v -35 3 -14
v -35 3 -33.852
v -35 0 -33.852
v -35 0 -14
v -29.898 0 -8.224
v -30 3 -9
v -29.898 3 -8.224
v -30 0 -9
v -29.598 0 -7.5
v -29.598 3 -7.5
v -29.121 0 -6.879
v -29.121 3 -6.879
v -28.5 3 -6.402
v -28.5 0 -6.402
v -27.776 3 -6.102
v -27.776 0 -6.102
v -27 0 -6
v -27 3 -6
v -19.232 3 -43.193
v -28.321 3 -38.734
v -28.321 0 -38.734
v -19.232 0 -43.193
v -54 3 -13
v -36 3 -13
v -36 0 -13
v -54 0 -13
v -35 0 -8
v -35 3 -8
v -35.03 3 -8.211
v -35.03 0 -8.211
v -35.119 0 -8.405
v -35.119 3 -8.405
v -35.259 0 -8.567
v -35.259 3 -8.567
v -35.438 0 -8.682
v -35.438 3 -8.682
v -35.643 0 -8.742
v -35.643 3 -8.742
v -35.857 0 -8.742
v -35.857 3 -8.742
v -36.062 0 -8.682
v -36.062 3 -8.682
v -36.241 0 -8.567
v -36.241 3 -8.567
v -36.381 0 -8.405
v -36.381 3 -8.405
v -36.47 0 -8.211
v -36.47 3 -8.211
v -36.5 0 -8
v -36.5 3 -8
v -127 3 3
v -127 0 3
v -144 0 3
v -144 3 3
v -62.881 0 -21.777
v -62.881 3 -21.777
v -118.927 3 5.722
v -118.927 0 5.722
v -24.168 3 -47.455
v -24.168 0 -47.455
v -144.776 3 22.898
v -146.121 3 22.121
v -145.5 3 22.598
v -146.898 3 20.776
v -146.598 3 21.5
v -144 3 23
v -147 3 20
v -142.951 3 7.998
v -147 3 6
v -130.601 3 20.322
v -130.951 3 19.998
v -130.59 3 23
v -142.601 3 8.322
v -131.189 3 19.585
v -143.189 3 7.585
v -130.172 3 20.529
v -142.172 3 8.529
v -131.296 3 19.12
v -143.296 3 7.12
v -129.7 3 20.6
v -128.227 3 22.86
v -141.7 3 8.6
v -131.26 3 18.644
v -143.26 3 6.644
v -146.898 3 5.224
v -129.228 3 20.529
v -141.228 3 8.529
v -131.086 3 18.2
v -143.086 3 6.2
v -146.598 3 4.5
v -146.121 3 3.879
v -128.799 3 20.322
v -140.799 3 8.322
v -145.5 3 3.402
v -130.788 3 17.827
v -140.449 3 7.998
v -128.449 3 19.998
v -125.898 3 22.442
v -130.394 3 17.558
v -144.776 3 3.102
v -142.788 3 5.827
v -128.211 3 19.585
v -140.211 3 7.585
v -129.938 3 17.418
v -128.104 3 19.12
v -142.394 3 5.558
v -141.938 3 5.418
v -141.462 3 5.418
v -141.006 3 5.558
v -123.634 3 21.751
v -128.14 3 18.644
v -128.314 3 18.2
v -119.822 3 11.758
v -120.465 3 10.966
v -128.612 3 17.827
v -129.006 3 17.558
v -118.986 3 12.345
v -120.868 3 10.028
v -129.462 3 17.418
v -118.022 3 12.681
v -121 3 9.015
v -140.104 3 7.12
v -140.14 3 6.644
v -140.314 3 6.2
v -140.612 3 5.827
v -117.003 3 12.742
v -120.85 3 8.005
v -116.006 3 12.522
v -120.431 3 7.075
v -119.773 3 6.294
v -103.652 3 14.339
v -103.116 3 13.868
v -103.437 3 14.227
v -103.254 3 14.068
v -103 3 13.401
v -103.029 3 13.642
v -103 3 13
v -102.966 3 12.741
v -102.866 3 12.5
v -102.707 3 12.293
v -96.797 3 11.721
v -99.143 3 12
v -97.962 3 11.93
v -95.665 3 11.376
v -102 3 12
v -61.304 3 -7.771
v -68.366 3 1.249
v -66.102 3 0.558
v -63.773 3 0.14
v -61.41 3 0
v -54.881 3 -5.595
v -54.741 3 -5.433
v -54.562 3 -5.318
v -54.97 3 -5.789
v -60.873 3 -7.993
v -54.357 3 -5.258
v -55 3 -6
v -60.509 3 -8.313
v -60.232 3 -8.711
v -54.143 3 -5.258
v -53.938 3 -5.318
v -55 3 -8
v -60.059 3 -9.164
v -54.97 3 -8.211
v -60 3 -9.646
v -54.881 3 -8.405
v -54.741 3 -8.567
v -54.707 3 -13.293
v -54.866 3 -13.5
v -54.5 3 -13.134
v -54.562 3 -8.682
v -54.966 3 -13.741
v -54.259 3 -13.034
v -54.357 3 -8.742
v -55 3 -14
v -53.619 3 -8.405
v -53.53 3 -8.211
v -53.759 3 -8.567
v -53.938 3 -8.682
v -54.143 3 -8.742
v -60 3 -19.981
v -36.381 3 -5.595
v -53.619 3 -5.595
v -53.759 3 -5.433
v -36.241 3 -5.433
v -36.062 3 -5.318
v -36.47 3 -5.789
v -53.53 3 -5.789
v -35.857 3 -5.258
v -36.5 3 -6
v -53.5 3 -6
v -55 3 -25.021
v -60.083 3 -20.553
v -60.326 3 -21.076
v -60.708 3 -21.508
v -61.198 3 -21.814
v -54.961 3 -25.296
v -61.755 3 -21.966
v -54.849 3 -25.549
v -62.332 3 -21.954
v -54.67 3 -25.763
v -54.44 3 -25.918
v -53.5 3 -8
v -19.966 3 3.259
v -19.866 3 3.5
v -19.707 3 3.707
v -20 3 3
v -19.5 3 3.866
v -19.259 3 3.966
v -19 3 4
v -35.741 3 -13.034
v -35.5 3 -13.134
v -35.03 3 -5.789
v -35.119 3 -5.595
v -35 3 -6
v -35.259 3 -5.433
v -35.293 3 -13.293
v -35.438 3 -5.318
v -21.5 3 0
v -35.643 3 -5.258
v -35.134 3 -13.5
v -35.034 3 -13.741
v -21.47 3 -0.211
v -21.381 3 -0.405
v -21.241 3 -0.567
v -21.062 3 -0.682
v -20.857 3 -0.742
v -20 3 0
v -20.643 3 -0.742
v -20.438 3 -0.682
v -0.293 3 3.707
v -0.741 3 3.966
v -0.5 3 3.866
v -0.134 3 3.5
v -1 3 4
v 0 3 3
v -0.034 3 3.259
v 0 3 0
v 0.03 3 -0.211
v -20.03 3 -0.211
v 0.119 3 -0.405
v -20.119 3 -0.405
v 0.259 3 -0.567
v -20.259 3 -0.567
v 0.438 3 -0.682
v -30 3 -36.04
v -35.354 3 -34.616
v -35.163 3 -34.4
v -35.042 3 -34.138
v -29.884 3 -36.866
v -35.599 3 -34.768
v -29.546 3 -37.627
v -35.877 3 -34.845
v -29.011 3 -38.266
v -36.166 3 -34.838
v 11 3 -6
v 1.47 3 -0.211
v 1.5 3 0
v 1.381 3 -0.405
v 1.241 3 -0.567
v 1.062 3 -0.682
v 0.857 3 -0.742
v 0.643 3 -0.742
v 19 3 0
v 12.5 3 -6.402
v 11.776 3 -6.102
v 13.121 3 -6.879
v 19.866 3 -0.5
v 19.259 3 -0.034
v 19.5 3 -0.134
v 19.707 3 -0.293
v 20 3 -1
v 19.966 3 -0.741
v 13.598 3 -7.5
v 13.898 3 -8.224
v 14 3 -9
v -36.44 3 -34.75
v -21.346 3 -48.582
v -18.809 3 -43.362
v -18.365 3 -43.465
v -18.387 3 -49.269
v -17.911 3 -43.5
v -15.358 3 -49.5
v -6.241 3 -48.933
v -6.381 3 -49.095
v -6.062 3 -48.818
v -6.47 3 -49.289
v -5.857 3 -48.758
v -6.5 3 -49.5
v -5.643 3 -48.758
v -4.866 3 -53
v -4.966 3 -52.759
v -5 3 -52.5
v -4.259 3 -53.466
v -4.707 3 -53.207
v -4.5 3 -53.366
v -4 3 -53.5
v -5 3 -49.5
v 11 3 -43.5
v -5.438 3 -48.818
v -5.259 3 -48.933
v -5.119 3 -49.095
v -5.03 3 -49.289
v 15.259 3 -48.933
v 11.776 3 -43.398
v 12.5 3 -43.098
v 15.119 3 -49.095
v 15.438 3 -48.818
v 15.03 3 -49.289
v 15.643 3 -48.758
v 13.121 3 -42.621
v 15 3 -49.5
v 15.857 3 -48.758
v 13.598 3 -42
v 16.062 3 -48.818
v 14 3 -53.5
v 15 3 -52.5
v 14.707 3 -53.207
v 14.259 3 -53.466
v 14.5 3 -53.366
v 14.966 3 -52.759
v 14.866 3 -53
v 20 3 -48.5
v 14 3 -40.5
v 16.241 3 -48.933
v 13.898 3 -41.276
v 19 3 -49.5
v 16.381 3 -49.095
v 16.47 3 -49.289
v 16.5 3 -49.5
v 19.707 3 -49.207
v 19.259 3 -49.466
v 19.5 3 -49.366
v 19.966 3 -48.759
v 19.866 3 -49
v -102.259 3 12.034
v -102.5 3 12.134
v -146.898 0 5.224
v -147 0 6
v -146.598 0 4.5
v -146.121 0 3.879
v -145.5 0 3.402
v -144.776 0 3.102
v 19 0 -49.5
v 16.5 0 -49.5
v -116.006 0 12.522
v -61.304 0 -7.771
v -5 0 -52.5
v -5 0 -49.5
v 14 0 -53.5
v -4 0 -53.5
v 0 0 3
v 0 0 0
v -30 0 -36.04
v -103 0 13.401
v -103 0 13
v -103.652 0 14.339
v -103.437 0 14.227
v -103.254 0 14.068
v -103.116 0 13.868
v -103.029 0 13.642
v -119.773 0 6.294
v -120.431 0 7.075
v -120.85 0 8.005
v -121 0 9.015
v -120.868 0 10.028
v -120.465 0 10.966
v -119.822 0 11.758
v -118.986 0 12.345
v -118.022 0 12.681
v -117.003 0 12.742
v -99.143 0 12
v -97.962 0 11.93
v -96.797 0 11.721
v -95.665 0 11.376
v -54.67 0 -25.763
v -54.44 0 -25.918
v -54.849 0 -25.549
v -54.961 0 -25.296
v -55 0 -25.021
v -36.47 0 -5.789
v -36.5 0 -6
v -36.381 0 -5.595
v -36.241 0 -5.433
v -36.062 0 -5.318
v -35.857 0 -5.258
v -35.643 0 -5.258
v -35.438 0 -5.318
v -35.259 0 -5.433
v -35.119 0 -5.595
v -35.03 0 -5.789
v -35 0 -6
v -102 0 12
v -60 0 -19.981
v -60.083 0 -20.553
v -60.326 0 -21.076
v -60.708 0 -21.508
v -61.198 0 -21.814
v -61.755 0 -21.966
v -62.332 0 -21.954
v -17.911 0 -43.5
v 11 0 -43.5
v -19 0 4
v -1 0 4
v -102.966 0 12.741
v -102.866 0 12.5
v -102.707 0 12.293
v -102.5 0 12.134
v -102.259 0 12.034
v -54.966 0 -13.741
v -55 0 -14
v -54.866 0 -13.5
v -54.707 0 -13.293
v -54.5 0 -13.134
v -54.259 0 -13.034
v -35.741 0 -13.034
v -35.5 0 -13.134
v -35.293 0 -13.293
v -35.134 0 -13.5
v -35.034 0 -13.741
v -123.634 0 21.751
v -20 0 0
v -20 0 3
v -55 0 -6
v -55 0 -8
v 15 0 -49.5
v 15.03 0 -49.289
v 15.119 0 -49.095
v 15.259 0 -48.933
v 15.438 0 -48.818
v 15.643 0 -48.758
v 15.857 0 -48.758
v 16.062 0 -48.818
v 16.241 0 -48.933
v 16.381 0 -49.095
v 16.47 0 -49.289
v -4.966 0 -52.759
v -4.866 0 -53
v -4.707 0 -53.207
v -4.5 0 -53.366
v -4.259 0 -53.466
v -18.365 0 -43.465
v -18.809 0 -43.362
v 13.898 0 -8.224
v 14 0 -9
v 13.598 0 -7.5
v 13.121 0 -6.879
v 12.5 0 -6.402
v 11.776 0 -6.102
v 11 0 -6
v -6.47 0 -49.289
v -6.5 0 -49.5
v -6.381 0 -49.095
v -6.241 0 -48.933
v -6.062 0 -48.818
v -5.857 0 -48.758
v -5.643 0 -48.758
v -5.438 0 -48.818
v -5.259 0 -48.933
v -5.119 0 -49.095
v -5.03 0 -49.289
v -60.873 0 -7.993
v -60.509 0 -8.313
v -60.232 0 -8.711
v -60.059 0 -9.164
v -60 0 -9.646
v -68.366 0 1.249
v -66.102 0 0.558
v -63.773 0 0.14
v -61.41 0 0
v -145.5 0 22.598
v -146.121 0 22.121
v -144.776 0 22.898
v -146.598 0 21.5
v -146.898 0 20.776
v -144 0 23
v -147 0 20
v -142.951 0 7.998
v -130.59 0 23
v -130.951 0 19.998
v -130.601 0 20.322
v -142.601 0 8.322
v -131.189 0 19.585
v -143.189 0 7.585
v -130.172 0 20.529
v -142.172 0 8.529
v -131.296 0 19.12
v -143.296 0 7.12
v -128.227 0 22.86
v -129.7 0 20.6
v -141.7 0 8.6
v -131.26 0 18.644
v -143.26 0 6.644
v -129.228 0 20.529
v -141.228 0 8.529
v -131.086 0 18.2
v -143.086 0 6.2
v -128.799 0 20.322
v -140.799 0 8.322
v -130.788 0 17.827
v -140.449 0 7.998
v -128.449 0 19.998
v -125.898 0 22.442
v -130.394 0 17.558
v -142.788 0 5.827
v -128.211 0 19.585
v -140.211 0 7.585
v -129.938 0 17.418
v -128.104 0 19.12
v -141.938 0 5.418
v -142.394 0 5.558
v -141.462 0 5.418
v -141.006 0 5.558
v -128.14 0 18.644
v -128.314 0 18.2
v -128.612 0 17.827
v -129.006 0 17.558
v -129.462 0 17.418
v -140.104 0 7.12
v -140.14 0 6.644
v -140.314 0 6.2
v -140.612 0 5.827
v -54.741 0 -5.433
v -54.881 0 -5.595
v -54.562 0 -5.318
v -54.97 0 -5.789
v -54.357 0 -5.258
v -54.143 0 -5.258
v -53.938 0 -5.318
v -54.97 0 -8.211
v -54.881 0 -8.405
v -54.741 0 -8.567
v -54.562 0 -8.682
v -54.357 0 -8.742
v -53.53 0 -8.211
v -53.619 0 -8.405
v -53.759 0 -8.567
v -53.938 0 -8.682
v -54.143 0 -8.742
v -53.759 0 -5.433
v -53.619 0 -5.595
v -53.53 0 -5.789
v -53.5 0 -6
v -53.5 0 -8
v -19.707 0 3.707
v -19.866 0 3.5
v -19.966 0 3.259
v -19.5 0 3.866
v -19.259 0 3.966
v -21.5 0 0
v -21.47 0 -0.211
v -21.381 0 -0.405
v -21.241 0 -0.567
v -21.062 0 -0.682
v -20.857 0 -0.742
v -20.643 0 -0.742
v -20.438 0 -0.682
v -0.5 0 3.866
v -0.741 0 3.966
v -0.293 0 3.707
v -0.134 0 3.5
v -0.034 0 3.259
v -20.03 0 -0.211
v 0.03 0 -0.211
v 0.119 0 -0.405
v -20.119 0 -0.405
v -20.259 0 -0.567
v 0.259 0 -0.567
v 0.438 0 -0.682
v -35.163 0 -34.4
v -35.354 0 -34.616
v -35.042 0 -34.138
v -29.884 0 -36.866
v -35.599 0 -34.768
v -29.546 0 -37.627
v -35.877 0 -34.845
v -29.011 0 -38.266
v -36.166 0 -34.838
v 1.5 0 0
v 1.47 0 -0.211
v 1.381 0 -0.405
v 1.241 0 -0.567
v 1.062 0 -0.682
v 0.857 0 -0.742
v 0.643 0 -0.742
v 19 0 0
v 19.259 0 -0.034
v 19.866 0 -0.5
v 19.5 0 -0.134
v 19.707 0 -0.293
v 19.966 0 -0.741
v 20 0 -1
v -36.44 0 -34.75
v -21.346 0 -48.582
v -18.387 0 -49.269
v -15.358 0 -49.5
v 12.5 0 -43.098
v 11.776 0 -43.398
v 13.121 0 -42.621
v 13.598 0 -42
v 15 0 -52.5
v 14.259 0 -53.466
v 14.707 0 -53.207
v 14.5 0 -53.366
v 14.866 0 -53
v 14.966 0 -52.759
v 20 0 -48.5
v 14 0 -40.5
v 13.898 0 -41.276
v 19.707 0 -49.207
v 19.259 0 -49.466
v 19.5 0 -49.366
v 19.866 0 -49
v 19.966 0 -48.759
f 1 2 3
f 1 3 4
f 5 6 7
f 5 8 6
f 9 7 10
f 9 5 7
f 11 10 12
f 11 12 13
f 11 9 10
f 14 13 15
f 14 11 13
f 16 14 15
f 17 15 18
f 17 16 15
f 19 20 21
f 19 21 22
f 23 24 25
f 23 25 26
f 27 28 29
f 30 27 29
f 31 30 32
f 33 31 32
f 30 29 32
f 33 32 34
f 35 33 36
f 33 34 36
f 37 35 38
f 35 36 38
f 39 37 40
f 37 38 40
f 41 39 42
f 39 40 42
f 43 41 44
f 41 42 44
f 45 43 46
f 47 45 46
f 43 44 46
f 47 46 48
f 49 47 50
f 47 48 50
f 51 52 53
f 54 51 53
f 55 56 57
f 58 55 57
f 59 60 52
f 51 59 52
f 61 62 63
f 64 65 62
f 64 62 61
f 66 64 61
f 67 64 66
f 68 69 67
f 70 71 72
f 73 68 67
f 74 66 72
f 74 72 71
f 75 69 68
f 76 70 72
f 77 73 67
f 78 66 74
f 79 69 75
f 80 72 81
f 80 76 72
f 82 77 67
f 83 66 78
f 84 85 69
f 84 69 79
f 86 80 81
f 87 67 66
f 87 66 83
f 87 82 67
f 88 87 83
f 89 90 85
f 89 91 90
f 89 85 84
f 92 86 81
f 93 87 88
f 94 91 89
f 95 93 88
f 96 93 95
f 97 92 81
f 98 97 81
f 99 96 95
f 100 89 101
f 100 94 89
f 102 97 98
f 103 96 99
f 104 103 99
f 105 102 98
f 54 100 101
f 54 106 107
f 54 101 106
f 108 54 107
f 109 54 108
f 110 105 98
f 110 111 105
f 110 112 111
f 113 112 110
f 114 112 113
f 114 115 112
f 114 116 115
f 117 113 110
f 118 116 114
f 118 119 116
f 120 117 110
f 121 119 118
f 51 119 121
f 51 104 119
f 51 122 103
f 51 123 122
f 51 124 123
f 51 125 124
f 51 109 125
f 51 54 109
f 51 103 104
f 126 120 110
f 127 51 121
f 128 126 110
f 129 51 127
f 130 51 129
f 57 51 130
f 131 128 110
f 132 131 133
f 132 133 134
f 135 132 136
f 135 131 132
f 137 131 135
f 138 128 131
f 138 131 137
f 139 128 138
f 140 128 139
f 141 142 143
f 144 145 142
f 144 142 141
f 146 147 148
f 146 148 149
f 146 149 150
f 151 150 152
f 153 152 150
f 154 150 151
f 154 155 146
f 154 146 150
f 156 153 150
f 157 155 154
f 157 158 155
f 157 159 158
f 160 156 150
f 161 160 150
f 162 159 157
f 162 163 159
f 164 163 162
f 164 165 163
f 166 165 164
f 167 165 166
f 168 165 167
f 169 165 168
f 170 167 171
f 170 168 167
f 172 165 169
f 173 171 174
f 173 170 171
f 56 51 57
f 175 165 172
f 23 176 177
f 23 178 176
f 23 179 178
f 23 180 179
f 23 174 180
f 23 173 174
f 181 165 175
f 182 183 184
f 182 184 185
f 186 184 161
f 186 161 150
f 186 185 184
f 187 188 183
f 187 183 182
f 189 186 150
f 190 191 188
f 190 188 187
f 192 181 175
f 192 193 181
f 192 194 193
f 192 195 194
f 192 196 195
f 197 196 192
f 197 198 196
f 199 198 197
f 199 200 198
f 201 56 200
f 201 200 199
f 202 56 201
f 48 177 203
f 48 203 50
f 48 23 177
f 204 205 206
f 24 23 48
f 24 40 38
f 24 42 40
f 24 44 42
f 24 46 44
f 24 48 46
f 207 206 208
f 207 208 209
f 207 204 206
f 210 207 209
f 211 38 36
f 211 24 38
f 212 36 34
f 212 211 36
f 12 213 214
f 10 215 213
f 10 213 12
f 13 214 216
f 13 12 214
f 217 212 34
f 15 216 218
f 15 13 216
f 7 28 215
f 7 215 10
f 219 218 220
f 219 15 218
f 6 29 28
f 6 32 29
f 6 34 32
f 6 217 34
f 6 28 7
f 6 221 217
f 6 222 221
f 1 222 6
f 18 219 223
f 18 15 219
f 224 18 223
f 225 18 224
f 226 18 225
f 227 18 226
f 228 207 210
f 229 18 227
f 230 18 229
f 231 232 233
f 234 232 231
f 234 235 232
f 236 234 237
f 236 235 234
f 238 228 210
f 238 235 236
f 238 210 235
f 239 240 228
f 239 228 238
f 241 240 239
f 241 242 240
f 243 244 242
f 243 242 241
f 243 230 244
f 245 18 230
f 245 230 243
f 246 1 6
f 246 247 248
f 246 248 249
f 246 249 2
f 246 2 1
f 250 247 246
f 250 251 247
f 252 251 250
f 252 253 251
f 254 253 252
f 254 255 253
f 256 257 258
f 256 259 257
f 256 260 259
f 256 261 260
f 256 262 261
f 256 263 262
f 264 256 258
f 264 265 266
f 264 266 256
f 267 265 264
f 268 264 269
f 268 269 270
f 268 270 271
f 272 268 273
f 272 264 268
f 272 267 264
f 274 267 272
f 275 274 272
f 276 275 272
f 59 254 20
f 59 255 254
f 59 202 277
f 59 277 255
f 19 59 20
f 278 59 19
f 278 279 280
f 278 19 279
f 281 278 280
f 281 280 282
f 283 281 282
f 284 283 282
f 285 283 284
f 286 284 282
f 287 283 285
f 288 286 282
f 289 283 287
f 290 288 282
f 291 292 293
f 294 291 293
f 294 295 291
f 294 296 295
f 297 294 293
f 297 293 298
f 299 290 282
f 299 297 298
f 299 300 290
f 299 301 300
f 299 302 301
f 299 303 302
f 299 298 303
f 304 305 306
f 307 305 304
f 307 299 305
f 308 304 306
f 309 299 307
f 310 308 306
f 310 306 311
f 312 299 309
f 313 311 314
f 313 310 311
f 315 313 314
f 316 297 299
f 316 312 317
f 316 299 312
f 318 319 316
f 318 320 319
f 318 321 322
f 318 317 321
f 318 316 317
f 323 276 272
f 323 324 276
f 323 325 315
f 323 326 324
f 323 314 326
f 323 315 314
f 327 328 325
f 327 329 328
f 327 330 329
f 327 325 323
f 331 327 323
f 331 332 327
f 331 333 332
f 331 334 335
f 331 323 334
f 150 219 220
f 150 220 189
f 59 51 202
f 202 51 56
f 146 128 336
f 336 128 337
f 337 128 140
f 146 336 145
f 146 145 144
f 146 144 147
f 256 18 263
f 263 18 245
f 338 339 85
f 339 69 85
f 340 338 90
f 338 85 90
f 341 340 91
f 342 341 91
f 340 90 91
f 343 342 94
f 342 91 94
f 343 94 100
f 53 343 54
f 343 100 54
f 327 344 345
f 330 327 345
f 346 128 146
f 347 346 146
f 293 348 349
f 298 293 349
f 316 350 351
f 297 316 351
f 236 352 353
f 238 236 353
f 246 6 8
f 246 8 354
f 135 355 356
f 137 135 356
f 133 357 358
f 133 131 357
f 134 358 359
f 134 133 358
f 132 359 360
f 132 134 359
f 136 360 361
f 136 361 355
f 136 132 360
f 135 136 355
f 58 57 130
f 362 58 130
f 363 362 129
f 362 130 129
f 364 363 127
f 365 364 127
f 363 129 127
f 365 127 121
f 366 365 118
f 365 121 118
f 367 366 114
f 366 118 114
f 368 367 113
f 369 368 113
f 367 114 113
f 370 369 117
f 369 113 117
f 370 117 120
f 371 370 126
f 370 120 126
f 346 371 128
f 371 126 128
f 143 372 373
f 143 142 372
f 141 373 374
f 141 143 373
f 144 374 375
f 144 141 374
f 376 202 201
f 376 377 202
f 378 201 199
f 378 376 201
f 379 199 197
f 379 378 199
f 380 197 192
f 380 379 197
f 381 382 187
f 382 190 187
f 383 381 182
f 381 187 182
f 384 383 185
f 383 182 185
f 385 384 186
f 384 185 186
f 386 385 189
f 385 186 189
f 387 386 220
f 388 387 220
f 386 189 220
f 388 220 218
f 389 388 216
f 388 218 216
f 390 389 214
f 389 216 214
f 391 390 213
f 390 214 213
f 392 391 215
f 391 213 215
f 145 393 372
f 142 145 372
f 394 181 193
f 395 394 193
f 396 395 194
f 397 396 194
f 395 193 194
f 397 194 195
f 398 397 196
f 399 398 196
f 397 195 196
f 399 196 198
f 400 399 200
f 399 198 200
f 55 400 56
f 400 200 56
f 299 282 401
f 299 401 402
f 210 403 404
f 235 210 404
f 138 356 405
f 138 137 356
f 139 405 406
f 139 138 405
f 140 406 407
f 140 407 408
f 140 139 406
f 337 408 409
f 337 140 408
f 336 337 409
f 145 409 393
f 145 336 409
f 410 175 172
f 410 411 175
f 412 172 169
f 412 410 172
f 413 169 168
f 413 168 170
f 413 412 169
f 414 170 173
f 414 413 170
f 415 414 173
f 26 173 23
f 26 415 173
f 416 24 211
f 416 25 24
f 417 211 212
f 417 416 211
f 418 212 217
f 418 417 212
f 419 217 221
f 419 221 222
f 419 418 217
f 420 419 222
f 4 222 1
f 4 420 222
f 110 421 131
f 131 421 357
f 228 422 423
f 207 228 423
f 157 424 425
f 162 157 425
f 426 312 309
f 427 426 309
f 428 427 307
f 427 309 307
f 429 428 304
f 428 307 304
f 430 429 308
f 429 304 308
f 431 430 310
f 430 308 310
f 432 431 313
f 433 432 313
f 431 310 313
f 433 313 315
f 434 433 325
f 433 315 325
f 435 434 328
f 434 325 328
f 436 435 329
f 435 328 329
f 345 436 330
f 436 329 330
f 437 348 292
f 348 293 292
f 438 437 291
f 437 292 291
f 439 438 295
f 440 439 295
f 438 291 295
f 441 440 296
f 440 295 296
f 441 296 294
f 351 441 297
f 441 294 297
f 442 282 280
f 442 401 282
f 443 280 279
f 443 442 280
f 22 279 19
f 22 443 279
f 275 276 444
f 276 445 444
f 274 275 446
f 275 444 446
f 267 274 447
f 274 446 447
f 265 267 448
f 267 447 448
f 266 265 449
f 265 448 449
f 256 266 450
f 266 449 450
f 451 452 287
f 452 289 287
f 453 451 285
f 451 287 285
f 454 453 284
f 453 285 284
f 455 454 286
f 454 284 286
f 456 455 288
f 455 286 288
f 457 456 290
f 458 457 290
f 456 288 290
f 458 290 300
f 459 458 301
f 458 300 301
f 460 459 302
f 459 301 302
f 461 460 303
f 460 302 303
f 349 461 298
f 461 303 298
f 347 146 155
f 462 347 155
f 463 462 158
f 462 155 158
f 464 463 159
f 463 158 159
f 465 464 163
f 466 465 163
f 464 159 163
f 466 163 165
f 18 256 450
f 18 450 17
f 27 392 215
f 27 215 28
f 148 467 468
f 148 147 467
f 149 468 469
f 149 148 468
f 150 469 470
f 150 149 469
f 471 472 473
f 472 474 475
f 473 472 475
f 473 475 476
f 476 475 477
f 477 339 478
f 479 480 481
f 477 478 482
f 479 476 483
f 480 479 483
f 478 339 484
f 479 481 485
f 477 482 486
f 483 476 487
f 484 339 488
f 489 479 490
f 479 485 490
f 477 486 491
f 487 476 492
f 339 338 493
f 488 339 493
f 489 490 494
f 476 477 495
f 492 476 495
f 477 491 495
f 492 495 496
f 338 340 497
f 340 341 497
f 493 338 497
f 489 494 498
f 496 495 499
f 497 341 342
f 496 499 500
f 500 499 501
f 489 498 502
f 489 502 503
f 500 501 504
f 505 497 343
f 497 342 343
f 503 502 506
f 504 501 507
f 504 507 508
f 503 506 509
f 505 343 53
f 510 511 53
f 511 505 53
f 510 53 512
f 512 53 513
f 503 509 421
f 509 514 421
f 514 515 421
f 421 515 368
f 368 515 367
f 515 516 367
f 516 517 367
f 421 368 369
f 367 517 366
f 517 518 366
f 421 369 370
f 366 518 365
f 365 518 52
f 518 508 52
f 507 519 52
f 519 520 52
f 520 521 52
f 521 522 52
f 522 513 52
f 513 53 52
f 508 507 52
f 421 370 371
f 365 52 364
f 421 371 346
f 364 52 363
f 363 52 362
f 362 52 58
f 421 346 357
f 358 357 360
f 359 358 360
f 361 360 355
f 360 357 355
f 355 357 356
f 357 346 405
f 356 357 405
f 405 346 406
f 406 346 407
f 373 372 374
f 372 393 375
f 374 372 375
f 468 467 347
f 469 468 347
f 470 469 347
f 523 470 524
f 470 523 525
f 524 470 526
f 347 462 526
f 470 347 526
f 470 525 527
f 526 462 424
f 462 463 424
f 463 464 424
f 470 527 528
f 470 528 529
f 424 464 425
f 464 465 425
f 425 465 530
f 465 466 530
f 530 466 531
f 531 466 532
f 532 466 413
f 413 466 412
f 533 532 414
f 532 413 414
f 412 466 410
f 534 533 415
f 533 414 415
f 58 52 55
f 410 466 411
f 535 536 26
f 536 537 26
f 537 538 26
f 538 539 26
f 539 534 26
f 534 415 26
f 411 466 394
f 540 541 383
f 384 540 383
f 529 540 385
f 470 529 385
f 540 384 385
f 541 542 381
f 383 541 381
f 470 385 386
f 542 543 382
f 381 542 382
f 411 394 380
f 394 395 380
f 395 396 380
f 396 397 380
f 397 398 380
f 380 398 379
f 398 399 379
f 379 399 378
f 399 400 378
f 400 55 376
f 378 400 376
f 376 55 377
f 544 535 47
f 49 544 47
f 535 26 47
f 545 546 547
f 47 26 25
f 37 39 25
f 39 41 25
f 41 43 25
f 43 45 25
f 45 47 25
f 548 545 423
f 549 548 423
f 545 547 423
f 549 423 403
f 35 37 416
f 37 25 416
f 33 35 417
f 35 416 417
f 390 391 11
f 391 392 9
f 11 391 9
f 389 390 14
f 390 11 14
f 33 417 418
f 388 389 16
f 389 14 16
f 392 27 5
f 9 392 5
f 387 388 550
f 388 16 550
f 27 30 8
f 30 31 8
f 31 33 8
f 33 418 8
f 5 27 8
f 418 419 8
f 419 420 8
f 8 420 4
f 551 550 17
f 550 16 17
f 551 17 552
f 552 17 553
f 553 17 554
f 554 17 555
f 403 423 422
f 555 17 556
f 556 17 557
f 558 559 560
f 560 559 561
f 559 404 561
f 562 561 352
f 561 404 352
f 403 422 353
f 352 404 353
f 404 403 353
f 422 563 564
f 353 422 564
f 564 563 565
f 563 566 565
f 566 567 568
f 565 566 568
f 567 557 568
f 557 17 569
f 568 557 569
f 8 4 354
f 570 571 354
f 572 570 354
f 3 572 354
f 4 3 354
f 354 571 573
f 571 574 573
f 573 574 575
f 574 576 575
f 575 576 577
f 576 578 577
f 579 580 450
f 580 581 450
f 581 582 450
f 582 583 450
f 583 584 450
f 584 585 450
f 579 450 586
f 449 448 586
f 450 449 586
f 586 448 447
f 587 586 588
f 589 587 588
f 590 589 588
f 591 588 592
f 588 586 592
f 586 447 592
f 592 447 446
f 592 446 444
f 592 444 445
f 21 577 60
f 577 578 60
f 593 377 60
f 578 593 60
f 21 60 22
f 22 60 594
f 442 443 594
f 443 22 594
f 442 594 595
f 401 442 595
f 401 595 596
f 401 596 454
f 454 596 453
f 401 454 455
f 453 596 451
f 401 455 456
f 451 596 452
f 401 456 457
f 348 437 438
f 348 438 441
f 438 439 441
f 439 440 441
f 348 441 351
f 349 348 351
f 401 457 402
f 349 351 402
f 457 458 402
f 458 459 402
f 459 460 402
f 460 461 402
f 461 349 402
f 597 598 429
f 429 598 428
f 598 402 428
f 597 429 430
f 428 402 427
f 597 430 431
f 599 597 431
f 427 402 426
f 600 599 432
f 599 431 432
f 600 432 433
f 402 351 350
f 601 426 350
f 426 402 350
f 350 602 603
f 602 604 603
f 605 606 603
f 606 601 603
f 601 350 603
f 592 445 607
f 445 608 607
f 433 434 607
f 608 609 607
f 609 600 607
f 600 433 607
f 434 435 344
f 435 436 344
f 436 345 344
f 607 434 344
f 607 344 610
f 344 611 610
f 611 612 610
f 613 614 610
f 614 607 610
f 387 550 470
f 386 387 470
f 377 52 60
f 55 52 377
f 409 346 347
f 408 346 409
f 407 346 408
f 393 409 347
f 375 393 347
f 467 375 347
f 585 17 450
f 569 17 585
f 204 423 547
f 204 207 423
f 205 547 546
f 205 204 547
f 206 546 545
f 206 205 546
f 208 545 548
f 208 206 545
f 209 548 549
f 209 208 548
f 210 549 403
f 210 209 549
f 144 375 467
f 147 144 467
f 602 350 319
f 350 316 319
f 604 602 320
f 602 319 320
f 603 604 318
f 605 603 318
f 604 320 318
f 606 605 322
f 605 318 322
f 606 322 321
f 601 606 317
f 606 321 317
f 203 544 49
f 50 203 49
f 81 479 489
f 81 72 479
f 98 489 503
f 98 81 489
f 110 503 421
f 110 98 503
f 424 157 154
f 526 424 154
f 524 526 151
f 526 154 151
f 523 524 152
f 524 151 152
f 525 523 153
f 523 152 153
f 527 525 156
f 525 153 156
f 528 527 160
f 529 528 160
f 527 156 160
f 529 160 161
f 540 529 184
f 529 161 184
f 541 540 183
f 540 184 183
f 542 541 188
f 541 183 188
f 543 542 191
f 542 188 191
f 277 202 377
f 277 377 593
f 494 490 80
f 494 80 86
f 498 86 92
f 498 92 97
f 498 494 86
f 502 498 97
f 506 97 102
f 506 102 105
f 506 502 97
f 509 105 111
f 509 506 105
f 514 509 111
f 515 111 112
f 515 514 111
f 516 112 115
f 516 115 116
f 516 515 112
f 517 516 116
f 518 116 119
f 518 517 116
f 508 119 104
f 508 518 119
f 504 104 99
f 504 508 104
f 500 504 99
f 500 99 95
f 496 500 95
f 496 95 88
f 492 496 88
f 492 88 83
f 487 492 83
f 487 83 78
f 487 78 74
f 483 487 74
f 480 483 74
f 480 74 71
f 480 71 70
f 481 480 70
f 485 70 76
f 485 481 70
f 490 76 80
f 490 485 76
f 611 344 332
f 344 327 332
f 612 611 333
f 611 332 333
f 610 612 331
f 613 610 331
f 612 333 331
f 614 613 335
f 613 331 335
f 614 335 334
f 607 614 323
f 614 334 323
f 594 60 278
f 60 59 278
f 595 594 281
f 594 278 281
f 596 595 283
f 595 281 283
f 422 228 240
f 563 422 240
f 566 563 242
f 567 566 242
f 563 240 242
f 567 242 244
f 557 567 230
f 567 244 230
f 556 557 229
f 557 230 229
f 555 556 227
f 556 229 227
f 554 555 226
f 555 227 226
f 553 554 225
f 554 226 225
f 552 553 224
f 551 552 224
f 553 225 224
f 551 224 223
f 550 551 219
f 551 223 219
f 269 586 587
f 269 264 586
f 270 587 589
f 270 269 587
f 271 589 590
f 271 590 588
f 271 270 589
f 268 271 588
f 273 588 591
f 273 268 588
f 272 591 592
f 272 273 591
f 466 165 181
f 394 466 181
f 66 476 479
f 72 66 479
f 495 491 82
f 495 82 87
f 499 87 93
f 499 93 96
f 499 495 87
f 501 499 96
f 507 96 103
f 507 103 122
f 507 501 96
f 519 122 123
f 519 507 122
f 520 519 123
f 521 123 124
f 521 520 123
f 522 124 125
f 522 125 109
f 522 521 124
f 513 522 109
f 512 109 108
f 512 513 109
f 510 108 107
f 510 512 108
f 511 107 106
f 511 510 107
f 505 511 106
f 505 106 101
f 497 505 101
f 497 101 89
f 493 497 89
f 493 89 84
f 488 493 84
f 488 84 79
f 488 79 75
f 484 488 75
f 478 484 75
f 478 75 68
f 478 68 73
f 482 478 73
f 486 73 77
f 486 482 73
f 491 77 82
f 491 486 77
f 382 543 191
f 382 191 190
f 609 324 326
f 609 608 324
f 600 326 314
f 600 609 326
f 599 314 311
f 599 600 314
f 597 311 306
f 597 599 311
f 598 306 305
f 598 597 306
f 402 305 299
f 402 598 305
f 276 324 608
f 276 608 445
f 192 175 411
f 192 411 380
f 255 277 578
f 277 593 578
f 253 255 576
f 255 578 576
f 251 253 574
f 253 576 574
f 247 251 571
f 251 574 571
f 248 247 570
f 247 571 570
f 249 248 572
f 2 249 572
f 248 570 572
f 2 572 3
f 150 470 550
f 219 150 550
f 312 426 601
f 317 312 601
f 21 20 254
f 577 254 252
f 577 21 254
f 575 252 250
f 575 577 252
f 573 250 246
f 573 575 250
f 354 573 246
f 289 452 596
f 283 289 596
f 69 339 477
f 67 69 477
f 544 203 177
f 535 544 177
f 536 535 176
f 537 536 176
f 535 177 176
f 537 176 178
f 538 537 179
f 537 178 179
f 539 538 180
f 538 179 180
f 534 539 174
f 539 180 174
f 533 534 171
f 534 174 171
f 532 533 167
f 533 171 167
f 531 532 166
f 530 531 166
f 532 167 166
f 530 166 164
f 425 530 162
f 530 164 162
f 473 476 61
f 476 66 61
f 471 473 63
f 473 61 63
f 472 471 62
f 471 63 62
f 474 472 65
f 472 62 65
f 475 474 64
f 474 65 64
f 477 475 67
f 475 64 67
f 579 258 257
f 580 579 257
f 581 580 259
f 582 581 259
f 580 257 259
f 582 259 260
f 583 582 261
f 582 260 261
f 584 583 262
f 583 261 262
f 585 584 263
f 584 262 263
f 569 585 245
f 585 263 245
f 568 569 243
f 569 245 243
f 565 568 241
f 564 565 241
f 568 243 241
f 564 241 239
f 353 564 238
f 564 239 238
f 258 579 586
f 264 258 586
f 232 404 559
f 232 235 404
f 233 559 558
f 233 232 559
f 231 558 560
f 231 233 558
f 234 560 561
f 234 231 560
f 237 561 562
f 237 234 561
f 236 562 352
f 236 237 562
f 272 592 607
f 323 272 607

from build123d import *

# Parameters (mm, degrees)
SKETCH_1_R          = 1.6
SKETCH_1_W          = 20
SKETCH_1_H          = 2
EXTRUDE_1_DEPTH     = 3
SKETCH_2_R          = 0.75
CUT_EXTRUDE_1_DEPTH = 157.461656645
FILLET_1_R          = 3
FILLET_2_R          = 20
FILLET_3_R          = 1
FILLET_4_R          = 10


with BuildPart() as part:
    # 草图1 → 凸台-拉伸1 (new body)
    with BuildSketch(Plane(origin=(0, 0, 0), x_dir=(1, 0, 0), z_dir=(0, 1, 0))):
        Polygon((0, 0), (20, 0), (20, 49.5), (15, 49.5), (15, 53.5), (-5, 53.5), (-5, 49.5), (-20, 49.5), (-127, -3), (-147, -3), (-147, -23), (-127, -23), (-103, -14.096774194), (-103, -12), (-97.347826087, -12), (-65, 0), (-20, 0), (-20, -4), (0, -4), align=None)
        with Locations(Location((-141.7, -7, 0), (0, 0, 270))):
            Circle(SKETCH_1_R, mode=Mode.SUBTRACT)
        with Locations(Location((-129.7, -19, 0), (0, 0, 270))):
            Circle(SKETCH_1_R, mode=Mode.SUBTRACT)
        with Locations((-45, 7)):
            Rectangle(SKETCH_1_W, SKETCH_1_H, mode=Mode.SUBTRACT)
    extrude(amount=EXTRUDE_1_DEPTH)

    # 草图2 → 切除-拉伸1 (cut, through all)
    with BuildSketch(Plane(origin=(0, 3, 0), x_dir=(1, 0, 0), z_dir=(0, 1, 0))):
        with Locations((-5.75, 49.5)):
            Circle(SKETCH_2_R)
        with Locations((15.75, 49.5)):
            Circle(SKETCH_2_R)
        with Locations((0.75, 0)):
            Circle(SKETCH_2_R)
        with Locations((-20.75, 0)):
            Circle(SKETCH_2_R)
        with Locations((-54.25, 8)):
            Circle(SKETCH_2_R)
        with Locations((-54.25, 6)):
            Circle(SKETCH_2_R)
        with Locations((-35.75, 6)):
            Circle(SKETCH_2_R)
        with Locations((-35.75, 8)):
            Circle(SKETCH_2_R)
        Polygon((14, 6), (-30, 6), (-30, 37.910143214), (-18.607339503, 43.5), (14, 43.5), align=None)
        Polygon((-35, 35.456872186), (-35, 13), (-55, 13), (-55, 25.643788074), align=None)
        with BuildLine():
            Line((-60, 9.645633867), (-60, 19.981437058))
            ThreePointArc((-60, 19.981437058), (-60.942161442, 21.678781332), (-62.880977584, 21.776953278))
            Line((-62.880977584, 21.776953278), (-118.927003728, -5.722265157))
            ThreePointArc((-118.927003728, -5.722265157), (-120.699269674, -10.510654148), (-116.006358262, -12.522165568))
            Line((-116.006358262, -12.522165568), (-61.304386354, 7.77050143))
            ThreePointArc((-61.304386354, 7.77050143), (-60.358167595, 8.503536518), (-60, 9.645633867))
        make_face()
    extrude(amount=-CUT_EXTRUDE_1_DEPTH, mode=Mode.SUBTRACT)

    # 圆角1
    fillet_1_edges = [part.edges().sort_by_distance(p)[0] for p in [
        (14, 1.5, -43.5),
        (14, 1.5, -6),
        (-30, 1.5, -6),
        (-30, 1.5, -37.910143214),
        (-18.607339503, 1.5, -43.5),
        (-147, 1.5, 23),
        (-147, 1.5, 3),
    ]]
    fillet(fillet_1_edges, radius=FILLET_1_R)

    # 圆角2
    fillet_2_edges = [part.edges().sort_by_distance(p)[0] for p in [
        (-65, 1.5, 0),
        (-127, 1.5, 23),
        (-20, 1.5, -49.5),
    ]]
    fillet(fillet_2_edges, radius=FILLET_2_R)

    # 圆角3
    fillet_3_edges = [part.edges().sort_by_distance(p)[0] for p in [
        (-55, 1.5, -13),
        (-55, 1.5, -25.643788074),
        (-35, 1.5, -35.456872186),
        (-35, 1.5, -13),
        (0, 1.5, 4),
        (-20, 1.5, 4),
        (-103, 1.5, 12),
        (-103, 1.5, 14.096774194),
        (-5, 1.5, -53.5),
        (15, 1.5, -53.5),
        (20, 1.5, -49.5),
        (20, 1.5, 0),
    ]]
    fillet(fillet_3_edges, radius=FILLET_3_R)

    # 圆角4
    fillet_4_edges = [part.edges().sort_by_distance(p)[0] for p in [
        (-97.347826087, 1.5, 12),
    ]]
    fillet(fillet_4_edges, radius=FILLET_4_R)


solid = part.part
